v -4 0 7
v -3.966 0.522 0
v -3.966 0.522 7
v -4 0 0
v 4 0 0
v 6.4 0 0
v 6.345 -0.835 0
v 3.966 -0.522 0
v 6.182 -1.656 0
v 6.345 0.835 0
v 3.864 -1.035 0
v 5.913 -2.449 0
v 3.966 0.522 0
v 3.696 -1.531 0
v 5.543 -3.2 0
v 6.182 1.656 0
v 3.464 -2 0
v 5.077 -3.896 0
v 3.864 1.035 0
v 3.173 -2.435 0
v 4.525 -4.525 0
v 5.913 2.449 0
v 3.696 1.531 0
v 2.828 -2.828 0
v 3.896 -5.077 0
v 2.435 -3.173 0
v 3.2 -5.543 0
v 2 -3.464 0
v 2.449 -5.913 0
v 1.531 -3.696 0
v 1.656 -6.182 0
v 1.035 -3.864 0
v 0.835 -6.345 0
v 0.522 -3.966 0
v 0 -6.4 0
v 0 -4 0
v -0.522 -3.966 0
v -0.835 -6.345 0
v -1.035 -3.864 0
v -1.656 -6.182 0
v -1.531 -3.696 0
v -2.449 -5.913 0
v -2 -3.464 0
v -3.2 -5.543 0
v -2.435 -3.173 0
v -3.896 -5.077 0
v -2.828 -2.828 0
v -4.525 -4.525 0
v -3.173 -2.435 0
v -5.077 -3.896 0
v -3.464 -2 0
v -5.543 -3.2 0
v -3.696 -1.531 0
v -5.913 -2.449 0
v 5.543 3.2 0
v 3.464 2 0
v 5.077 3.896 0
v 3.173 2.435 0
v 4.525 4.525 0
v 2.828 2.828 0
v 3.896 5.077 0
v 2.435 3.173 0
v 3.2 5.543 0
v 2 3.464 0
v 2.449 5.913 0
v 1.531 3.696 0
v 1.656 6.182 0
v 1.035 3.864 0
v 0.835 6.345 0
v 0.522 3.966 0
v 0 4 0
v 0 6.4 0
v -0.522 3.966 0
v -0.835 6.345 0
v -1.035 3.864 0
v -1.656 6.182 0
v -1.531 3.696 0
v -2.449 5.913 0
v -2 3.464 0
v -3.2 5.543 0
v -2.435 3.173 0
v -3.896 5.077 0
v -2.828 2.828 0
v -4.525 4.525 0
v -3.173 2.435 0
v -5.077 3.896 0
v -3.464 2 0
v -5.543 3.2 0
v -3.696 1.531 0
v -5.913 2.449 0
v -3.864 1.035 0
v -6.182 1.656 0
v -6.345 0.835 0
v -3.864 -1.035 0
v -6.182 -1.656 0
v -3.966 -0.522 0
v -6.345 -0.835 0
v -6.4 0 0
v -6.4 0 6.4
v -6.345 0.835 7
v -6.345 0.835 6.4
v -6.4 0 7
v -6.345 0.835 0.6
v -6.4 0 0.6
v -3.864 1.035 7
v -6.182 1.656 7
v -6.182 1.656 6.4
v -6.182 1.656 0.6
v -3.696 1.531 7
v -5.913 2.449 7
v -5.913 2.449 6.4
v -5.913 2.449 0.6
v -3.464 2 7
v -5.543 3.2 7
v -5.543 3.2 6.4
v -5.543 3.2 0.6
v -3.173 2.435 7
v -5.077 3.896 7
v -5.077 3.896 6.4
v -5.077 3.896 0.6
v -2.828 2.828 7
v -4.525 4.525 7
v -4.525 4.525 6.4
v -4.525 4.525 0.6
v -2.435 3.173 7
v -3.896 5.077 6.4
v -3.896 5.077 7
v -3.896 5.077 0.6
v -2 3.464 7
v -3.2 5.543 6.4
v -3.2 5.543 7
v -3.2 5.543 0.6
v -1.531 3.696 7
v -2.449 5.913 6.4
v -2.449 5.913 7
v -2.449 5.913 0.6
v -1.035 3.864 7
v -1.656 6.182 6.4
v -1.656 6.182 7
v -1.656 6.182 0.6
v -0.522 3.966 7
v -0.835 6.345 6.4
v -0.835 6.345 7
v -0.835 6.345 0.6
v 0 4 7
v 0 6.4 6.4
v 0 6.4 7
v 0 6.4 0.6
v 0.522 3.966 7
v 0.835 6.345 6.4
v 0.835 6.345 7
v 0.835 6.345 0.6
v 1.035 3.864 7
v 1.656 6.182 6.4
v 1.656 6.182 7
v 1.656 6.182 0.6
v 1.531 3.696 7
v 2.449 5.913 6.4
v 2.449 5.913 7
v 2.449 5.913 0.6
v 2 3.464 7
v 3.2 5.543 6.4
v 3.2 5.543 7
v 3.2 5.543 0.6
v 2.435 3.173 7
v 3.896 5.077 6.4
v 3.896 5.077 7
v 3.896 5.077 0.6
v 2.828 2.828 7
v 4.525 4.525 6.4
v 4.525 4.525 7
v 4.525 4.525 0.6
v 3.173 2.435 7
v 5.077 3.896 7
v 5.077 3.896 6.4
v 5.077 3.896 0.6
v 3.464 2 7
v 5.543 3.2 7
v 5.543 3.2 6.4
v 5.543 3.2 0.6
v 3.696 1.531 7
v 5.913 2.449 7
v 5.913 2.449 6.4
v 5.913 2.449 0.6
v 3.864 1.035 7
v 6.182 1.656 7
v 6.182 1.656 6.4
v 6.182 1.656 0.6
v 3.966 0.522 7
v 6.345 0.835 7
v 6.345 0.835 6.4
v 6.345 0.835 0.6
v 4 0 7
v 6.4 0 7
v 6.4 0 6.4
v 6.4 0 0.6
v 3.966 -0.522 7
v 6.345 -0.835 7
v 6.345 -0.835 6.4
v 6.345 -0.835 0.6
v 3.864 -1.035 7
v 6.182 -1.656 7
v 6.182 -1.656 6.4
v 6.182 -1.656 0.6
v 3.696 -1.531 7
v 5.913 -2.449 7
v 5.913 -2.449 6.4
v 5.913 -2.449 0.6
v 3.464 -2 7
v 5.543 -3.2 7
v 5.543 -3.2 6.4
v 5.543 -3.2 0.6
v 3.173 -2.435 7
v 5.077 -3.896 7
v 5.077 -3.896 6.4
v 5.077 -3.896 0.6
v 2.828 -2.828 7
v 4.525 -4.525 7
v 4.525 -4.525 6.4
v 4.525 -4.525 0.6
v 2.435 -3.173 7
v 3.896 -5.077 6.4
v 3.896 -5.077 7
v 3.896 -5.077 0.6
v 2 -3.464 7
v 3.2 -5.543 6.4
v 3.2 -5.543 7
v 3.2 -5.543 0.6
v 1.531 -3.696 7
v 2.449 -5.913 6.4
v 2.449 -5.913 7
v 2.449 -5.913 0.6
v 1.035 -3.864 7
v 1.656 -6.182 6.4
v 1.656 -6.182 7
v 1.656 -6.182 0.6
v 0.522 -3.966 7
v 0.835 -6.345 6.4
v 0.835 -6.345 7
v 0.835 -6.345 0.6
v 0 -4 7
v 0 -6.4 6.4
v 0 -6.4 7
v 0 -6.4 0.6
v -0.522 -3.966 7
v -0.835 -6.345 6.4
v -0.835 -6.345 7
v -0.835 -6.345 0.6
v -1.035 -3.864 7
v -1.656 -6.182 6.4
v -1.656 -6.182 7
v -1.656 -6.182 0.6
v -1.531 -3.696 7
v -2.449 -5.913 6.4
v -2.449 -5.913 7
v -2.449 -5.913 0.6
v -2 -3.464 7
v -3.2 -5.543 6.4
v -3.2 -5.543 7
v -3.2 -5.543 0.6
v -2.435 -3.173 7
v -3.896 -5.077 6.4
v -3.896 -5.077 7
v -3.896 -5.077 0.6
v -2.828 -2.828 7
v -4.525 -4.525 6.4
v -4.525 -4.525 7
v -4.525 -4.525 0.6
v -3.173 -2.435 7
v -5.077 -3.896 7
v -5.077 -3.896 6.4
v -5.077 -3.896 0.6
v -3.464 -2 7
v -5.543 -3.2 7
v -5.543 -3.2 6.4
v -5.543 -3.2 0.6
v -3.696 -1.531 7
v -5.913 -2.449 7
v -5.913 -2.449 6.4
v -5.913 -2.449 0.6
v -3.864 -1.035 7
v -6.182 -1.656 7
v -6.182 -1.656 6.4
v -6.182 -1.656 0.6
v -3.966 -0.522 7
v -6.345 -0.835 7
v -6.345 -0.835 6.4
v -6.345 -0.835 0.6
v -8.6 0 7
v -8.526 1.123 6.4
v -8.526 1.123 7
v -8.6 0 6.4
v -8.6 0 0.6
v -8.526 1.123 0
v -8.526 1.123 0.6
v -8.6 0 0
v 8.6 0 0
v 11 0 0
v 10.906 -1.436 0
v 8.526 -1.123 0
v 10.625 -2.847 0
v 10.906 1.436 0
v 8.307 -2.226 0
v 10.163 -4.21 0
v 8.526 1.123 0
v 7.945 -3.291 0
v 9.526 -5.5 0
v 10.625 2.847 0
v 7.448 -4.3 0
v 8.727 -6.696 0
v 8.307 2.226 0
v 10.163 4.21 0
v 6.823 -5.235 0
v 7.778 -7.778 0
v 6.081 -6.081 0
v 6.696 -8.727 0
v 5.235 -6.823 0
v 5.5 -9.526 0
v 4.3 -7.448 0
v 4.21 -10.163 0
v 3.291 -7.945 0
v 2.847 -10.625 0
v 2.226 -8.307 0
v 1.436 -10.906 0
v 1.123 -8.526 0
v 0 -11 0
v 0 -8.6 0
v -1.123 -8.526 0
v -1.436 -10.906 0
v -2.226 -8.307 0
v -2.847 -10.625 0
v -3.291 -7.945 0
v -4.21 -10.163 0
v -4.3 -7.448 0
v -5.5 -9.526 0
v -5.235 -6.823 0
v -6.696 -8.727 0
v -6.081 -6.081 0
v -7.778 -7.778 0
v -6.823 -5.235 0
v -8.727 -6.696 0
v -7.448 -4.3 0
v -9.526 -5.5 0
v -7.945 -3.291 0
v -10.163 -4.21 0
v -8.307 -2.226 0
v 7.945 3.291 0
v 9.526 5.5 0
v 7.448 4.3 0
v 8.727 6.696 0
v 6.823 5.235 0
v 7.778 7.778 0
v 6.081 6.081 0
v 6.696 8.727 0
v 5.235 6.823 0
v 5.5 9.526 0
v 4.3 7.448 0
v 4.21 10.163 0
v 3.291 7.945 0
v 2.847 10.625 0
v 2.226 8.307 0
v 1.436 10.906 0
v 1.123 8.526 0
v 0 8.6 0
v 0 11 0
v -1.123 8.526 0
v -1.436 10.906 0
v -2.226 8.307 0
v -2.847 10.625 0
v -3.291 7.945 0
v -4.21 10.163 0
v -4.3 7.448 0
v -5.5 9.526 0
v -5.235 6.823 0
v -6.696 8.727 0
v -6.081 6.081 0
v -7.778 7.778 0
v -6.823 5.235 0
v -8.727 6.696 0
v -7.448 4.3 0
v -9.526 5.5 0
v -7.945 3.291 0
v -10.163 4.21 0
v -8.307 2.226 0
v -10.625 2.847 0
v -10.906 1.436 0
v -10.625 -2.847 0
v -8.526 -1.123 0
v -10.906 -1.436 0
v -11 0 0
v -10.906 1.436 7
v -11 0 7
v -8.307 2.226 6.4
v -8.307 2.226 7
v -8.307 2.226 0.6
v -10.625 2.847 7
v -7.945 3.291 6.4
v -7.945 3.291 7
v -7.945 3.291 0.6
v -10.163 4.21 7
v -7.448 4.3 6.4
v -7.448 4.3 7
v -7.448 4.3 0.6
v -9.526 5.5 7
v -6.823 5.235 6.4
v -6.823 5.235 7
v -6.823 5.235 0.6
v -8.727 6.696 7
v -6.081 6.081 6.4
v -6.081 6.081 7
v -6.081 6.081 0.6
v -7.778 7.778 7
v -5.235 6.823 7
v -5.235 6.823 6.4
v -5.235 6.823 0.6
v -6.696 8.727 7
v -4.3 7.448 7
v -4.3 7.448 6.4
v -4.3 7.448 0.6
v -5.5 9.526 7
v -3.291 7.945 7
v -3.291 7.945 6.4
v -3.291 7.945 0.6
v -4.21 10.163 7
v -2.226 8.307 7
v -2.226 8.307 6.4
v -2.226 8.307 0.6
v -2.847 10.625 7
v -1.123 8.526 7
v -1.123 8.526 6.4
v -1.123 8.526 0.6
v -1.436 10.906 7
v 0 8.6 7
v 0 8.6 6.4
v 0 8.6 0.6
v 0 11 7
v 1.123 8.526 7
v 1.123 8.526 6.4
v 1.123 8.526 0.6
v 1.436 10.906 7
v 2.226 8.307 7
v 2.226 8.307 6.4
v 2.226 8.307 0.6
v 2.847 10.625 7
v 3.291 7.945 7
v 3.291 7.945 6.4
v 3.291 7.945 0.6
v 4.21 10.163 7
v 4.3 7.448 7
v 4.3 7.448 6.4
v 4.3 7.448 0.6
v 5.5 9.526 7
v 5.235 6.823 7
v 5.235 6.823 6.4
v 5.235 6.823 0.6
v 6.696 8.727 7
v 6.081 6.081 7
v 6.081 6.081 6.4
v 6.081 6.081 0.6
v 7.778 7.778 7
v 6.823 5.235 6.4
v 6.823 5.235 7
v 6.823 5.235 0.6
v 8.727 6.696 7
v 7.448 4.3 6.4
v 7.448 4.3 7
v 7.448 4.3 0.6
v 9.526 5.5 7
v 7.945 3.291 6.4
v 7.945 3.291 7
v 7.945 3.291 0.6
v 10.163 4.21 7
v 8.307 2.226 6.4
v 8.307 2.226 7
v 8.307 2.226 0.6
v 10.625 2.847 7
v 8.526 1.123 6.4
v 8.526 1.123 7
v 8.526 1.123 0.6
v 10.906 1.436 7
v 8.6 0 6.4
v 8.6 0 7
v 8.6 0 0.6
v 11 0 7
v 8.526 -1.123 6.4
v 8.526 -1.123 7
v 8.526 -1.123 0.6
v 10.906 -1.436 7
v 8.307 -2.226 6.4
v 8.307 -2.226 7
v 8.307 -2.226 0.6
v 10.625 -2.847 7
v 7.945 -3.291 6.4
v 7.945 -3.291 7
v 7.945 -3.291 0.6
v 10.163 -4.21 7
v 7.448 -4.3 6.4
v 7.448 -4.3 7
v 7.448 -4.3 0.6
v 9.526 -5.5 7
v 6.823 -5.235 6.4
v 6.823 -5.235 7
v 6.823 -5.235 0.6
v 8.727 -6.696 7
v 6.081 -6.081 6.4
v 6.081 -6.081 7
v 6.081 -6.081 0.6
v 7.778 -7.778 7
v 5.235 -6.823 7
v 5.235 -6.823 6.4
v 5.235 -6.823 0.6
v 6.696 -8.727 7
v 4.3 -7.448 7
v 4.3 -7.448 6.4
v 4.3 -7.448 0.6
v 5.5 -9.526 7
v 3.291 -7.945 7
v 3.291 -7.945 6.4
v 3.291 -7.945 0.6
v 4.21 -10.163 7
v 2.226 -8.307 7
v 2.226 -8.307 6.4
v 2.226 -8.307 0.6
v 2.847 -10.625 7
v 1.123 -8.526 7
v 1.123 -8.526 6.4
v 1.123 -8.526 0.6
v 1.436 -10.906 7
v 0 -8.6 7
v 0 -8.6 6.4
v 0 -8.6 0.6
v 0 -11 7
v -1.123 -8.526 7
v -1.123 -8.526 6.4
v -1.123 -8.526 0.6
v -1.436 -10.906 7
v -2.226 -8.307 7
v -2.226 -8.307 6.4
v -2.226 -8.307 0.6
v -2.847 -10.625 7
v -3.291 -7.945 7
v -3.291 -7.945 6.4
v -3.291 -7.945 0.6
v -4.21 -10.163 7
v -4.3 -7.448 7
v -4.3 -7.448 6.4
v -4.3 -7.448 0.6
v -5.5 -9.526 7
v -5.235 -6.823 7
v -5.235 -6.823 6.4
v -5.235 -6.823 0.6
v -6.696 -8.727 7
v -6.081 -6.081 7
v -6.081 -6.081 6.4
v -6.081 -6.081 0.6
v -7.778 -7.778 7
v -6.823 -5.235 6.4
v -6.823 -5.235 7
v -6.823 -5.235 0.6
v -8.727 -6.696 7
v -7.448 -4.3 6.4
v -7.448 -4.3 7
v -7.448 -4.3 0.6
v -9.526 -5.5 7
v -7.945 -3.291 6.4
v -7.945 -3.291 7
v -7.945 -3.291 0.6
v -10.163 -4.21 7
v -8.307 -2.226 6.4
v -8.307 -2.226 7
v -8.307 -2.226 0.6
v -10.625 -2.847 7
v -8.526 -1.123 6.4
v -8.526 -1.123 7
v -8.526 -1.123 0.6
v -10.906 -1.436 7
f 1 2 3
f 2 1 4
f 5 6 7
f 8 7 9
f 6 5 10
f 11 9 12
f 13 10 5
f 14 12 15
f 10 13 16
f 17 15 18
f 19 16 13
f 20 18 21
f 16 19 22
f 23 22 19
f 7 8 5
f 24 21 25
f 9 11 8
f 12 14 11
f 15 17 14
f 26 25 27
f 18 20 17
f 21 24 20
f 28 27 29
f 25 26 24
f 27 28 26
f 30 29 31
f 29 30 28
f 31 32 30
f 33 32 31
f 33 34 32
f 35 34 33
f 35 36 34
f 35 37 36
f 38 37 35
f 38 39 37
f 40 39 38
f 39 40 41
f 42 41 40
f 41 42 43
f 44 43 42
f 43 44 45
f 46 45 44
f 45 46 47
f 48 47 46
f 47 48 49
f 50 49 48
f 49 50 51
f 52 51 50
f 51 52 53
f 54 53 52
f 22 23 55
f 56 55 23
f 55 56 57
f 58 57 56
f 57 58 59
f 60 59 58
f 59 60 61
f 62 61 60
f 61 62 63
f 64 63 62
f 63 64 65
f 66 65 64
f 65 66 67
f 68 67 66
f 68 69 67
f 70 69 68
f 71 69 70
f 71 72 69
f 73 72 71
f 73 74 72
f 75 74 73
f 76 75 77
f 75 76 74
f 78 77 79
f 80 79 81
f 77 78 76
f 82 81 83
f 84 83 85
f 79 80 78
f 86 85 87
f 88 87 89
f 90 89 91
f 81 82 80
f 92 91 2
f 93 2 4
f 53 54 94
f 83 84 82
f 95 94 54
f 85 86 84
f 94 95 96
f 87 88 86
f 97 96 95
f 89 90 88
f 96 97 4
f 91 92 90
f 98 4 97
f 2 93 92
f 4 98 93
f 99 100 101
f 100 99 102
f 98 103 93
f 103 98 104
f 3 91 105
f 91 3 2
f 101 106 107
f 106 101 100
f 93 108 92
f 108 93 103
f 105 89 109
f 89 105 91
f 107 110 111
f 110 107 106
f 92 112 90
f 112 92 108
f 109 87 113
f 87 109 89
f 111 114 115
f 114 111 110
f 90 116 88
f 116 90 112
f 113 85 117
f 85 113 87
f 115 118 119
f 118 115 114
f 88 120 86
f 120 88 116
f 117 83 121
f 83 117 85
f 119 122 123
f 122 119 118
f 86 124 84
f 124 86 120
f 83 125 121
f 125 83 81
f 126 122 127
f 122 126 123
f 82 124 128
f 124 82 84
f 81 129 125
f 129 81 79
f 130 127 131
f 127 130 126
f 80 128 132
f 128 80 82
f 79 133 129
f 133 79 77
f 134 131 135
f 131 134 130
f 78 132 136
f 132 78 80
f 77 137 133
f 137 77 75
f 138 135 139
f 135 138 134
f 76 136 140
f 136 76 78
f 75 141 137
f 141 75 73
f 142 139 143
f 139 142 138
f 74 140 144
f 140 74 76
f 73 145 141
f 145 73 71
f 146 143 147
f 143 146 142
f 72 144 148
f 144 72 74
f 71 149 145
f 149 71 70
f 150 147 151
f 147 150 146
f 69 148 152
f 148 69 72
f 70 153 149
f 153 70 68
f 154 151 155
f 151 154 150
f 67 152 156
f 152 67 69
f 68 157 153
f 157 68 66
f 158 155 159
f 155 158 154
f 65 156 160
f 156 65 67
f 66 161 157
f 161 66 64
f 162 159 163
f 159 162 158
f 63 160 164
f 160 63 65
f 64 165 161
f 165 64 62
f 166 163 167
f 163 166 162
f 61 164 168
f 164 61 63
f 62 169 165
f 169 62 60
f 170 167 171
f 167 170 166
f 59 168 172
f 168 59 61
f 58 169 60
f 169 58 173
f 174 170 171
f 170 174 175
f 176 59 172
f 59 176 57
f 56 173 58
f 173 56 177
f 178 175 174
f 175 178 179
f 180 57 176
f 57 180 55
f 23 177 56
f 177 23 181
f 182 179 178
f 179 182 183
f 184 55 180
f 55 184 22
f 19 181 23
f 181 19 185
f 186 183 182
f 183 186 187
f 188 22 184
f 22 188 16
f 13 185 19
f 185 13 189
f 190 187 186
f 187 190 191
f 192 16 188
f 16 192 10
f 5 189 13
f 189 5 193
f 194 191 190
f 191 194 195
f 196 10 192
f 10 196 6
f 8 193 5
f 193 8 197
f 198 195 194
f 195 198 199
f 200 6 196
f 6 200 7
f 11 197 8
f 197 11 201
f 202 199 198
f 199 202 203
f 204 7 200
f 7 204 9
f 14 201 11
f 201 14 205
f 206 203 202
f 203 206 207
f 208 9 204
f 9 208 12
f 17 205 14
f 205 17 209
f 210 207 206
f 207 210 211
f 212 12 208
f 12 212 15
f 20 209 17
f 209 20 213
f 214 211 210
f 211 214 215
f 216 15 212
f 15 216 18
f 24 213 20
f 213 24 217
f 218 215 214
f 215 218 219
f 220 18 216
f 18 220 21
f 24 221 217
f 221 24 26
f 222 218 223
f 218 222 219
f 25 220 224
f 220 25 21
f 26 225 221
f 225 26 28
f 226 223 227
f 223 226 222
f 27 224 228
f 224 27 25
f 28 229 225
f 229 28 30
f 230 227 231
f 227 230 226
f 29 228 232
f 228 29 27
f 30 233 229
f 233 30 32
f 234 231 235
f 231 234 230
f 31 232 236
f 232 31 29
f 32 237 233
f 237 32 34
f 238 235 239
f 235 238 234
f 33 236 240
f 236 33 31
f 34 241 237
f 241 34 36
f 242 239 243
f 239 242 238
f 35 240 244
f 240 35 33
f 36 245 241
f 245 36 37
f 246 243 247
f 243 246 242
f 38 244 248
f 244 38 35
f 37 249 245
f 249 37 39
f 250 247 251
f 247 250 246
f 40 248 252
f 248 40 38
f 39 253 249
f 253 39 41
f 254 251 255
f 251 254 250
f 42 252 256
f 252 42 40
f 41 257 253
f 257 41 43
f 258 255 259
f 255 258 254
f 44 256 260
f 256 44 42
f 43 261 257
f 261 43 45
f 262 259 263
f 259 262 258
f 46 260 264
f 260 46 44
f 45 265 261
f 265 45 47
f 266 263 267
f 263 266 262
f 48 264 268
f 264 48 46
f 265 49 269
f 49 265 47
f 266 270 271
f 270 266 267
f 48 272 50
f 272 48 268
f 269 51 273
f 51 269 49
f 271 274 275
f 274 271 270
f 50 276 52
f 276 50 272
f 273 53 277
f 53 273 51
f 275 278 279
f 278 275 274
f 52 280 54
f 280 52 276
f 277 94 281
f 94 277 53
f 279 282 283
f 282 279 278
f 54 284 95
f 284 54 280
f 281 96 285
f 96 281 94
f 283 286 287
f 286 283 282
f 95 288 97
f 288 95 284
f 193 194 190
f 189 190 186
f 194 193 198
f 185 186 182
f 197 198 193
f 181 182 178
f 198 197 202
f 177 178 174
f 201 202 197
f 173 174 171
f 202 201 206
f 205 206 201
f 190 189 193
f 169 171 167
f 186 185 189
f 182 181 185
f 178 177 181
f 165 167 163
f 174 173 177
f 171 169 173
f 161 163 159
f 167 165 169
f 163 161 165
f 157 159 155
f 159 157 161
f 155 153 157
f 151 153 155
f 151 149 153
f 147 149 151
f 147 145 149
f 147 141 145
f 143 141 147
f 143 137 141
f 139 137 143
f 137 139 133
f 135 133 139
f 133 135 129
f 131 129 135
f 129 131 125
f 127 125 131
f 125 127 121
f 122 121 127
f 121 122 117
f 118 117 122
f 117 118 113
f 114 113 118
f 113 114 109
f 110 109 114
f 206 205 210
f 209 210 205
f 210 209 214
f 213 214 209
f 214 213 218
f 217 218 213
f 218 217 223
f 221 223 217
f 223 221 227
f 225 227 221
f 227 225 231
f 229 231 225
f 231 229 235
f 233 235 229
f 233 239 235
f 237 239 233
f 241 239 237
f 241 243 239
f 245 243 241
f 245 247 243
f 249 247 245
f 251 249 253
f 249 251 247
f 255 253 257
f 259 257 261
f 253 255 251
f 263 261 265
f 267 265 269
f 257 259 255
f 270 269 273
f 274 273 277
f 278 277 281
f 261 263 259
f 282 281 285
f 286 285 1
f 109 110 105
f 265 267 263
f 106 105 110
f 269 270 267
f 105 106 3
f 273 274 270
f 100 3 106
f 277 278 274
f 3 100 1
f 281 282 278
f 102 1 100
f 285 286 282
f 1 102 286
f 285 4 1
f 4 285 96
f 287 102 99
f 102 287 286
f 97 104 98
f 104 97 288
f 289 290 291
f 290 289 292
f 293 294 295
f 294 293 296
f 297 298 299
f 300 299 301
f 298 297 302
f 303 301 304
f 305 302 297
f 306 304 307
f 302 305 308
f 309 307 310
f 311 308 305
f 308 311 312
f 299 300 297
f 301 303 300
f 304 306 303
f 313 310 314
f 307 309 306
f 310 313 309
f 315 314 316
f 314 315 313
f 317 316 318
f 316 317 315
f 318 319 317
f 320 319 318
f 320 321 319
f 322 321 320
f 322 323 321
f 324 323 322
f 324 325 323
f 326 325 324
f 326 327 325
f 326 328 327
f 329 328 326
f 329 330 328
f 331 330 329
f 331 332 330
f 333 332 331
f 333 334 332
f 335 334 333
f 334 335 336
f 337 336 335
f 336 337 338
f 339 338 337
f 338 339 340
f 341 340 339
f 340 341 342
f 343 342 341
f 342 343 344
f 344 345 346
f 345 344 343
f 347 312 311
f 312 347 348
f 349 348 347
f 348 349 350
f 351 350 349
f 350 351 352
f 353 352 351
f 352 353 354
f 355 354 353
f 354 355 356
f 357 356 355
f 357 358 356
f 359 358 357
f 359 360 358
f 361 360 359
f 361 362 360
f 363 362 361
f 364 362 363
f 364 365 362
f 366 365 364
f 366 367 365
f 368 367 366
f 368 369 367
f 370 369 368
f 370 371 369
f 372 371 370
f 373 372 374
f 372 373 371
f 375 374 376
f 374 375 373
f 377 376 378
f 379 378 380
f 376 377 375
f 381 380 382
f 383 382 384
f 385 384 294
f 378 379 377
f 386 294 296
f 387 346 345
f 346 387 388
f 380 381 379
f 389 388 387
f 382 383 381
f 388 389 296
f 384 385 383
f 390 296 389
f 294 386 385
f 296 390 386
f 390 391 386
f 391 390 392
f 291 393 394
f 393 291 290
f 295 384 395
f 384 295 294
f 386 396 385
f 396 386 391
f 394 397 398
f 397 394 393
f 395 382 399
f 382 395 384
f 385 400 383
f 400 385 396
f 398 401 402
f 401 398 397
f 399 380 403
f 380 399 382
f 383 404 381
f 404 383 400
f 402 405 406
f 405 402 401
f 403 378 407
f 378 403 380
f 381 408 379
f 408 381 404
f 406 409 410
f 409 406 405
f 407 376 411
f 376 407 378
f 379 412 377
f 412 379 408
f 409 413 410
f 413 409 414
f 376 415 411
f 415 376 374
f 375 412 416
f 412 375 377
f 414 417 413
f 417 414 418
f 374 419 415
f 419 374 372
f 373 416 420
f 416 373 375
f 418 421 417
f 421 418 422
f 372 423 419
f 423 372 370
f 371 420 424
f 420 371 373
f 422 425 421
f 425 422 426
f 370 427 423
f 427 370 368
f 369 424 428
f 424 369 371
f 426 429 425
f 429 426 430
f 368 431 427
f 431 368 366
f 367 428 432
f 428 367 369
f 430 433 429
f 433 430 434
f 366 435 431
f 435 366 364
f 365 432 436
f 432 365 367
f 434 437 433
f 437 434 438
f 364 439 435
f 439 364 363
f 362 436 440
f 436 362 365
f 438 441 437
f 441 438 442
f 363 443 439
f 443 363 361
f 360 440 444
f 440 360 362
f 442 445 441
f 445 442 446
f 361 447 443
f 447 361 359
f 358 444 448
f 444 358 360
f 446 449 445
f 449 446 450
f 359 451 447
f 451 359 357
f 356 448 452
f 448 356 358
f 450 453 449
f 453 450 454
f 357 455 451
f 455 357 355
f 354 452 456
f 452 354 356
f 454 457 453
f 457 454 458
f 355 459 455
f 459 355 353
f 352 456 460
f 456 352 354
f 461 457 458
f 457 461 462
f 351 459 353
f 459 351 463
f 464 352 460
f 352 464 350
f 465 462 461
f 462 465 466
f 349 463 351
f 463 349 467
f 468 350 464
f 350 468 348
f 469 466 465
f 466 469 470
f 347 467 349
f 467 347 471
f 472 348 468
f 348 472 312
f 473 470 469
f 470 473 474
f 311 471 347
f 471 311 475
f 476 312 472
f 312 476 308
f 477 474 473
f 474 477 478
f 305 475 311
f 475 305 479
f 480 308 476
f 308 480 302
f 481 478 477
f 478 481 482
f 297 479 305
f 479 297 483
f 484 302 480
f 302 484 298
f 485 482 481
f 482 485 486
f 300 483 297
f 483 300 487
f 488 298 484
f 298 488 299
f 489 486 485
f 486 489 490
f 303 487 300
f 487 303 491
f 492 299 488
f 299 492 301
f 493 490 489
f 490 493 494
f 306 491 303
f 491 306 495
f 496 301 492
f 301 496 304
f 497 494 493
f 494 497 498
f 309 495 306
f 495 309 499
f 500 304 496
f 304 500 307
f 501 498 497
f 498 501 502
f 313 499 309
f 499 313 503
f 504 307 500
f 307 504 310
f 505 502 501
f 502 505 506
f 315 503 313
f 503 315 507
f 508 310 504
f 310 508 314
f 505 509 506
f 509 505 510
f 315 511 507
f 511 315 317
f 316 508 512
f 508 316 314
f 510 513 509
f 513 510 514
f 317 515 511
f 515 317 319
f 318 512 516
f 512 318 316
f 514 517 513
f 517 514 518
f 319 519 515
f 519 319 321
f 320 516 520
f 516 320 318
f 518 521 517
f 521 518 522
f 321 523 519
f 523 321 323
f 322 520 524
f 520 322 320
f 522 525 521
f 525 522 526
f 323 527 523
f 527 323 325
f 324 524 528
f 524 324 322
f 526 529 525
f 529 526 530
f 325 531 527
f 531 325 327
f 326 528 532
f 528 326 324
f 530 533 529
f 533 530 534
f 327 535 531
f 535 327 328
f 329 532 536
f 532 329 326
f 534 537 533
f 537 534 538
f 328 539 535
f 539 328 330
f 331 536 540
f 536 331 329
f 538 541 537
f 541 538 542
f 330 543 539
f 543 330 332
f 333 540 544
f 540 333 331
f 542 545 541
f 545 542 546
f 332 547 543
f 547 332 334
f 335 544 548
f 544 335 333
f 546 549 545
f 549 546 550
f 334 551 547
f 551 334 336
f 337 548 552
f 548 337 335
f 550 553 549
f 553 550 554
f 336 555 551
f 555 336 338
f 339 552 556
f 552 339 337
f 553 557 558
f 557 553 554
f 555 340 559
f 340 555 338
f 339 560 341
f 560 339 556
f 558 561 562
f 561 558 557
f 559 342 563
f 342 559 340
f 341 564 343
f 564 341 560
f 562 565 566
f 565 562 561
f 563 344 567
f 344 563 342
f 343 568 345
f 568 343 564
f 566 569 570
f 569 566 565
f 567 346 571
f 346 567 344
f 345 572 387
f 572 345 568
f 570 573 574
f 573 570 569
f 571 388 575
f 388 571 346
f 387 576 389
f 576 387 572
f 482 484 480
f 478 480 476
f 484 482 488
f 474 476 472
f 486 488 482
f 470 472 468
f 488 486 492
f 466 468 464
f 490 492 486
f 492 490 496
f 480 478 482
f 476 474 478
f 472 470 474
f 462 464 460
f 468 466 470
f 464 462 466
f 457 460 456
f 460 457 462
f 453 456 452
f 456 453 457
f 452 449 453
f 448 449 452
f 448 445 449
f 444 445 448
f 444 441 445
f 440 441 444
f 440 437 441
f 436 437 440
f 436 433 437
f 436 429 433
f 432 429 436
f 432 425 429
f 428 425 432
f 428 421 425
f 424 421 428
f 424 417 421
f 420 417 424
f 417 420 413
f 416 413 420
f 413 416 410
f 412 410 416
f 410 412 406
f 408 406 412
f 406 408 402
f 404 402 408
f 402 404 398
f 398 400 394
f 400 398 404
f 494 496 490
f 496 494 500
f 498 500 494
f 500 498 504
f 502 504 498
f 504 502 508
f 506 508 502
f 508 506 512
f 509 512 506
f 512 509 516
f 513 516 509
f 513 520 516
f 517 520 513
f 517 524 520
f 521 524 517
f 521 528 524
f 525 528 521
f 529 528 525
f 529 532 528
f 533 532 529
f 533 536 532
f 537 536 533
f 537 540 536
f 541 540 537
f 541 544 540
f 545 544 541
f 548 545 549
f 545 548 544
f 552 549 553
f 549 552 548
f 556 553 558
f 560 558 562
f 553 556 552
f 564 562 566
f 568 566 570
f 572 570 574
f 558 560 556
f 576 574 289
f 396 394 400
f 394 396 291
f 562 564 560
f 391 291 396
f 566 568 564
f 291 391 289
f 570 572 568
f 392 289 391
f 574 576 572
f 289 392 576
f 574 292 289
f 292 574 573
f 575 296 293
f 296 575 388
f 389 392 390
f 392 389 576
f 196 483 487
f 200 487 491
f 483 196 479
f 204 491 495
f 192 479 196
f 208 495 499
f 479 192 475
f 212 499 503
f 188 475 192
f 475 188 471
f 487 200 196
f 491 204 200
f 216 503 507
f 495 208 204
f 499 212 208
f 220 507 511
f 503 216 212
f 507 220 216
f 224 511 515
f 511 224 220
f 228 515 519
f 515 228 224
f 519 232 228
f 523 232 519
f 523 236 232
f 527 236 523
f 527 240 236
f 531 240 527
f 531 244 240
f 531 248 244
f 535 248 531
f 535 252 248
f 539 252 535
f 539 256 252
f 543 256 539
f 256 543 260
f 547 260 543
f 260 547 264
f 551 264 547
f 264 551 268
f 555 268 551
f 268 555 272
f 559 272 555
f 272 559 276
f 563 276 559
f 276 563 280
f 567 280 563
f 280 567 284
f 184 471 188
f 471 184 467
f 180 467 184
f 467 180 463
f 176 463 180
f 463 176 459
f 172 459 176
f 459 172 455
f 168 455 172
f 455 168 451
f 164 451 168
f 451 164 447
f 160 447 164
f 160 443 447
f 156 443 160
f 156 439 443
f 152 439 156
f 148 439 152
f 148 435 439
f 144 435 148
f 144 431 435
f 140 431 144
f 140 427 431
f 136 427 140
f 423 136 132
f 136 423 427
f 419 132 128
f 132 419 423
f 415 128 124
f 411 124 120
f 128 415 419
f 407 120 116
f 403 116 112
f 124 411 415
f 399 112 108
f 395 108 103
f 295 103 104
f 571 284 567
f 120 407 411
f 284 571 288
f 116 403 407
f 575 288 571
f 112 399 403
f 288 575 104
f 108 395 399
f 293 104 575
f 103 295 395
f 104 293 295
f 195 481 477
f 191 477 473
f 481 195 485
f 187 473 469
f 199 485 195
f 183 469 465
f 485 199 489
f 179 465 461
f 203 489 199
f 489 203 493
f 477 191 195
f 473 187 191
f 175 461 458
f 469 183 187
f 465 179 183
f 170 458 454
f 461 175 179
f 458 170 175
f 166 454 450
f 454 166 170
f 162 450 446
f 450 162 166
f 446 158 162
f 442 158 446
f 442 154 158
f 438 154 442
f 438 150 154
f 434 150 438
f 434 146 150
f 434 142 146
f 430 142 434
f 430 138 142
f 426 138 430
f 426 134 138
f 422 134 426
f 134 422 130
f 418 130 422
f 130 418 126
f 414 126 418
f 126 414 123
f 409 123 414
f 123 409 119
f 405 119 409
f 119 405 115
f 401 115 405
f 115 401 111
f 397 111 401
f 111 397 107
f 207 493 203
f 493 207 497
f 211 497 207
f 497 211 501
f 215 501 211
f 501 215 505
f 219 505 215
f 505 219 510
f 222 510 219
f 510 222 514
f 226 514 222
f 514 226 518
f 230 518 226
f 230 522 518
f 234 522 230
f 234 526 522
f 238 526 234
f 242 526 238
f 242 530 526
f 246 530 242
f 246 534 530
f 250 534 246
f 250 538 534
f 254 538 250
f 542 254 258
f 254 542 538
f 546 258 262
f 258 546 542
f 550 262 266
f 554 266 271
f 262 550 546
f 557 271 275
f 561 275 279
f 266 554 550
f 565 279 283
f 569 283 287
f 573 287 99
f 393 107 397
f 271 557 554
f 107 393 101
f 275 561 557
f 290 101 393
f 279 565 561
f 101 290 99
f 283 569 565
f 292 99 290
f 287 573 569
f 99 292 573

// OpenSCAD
// file: ../config.scad
// SCARA 로봇 공통 사양(specification) — 모든 부품 파일에서 include해 사용한다.

$fn = 48;

// ── 공차(tolerance) ──
print_clearance = 0.2;   // FDM 출력 끼워맞춤(fit) 여유 — 압입(press-fit) 자리 제외
eps             = 1/128; // 미세 겹침(epsilon) — 접하는 솔리드를 살짝 겹쳐 동일면(coincident face) z-파이팅 방지

// ── FDM 출력 사양(print specification) ──
fdm_layer_h       = 0.28;   // 레이어 높이(layer height) — 슬라이서(slicer) 설정값과 일치시킨다.
fdm_shoulder_layers = 6;   // 숄더(shoulder) 최소 레이어 수 — FDM 최소 구조 벽(0.4mm 노즐 3겹 ~1.2mm) 기준 하한값.

// ── 레이아웃(layout) ──
// layout_margin — 플레이트 위 부품 배치 공통 여백(margin). 부품 외곽선에서
// 사방으로 주는 값 → 부품끼리는 2*margin 이격, 외곽 가장자리도 margin 확보.
layout_margin = 4;

// ── 시트 형상(seat geometry) ──
// seat_shoulder_t — fdm_layer_h · fdm_shoulder_layers 파생. 슬라이서 설정 변경 시 자동 연동.
seat_shoulder_t = fdm_layer_h * fdm_shoulder_layers;
// main file
/*
 * ball_bearings.scad - 볼 베어링(ball bearing) 기성품(vitamin)
 *
 * SCARA 회전 관절축(revolute axis)과 WAIST 저널에 공통으로 쓰는 608ZZ
 * 베어링(8 x 22 x 7) 시각화용 모델. SCARA_KINEMATICS.md의 AXIS_BEARINGS·
 * WAIST_BEARINGS, docs/BOM.md를 따른다.
 *
 * Z 브레이크포인트(Z breakpoint) 최적화: 베어링은 회전 대칭(rotationally
 * symmetric)이라 내륜(inner race)·외륜(outer race)·실드(shield)를 각각
 * 사각 단면 한 개의 rotate_extrude 링으로만 만든다. 원기둥 union·difference
 * 없이 색상별 솔리드 3개로 끝낸다.
 *
 * 좌표계: 축(axis) = Z, 베어링 중심 = 원점. 폭(width)은 z=0..w.
 */

include <../config.scad>

/* --- 형상 비율(cosmetic) --- */
race_t		= 2.4;	/* 내·외륜(race) 반경 두께(radial thickness) */
shield_inset	= 0.6;	/* 실드(shield) 축방향 인셋(inset) */

/* --- 색상(cosmetic) --- */
c_race		= [0.52, 0.53, 0.56];	/* 내·외륜 — 크롬강(chrome steel) */
c_shield	= [0.70, 0.71, 0.74];	/* 실드(ZZ) 금속 커버 */

/*
 * 볼 베어링 — bore_d(내경) x od(외경) x w(폭). 내륜·외륜은 전폭(full
 * width), 실드는 그 사이를 인셋(inset)해 끼운다. 각 링은 사각 단면
 * 하나의 단일 rotate_extrude(중첩 모듈 bearing_ring)로 만든다.
 */
module ball_bearing(bore_d, od, w)
{
	ir = bore_d / 2;	/* 내경 반지름 */
	or = od / 2;		/* 외경 반지름 */

	/* Z 브레이크포인트 사각 링 — 반경 r0..r1, 높이 z0..z1 단일 회전체 */
	module bearing_ring(r0, r1, z0, z1)
		rotate_extrude(convexity = 2)
			polygon([[r0, z0], [r1, z0], [r1, z1], [r0, z1]]);

	color(c_race) {
		/* 내륜(inner race) — 전폭 */
		bearing_ring(ir, ir + race_t, 0, w);
		/* 외륜(outer race) — 전폭 */
		bearing_ring(or - race_t, or, 0, w);
	}

	/* 실드(shield) — 내·외륜 사이, 양면 인셋 */
	color(c_shield)
		bearing_ring(ir + race_t, or - race_t,
			     shield_inset, w - shield_inset);
}

/* --- 표준 변형(convenience) --- */
module bearing_608() { ball_bearing(8, 22, 7); }	/* 회전축·WAIST */

bearing_608();
